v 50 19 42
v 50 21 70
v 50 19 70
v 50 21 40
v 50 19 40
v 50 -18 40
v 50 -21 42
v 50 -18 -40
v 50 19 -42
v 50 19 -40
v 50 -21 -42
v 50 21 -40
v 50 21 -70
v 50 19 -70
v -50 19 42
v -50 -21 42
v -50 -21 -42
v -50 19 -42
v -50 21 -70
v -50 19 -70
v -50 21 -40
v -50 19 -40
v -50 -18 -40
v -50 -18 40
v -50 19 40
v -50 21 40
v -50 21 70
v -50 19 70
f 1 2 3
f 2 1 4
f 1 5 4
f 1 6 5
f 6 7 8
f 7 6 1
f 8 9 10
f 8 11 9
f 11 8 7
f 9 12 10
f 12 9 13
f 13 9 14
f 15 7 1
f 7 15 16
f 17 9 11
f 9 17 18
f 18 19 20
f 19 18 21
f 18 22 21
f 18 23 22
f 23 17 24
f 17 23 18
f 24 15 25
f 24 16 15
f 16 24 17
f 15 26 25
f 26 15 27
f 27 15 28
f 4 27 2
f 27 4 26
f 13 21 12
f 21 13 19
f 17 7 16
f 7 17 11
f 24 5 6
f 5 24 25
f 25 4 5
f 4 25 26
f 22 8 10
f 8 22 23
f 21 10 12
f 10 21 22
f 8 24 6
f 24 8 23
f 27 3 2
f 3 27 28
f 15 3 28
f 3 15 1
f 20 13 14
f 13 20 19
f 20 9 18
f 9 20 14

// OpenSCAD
depth=40;
height=80;
length=100;
wall=2;
earheight=30;

difference()
{
    cube([length,depth+wall,height+2*wall],center=true);
    translate([0,wall,0])cube([length,depth,height],center=true);
}
translate([0,depth/2,height/2+earheight/2])cube([length,wall,earheight],center=true);

translate([0,depth/2,-height/2+-earheight/2])cube([length,wall,earheight],center=true);
